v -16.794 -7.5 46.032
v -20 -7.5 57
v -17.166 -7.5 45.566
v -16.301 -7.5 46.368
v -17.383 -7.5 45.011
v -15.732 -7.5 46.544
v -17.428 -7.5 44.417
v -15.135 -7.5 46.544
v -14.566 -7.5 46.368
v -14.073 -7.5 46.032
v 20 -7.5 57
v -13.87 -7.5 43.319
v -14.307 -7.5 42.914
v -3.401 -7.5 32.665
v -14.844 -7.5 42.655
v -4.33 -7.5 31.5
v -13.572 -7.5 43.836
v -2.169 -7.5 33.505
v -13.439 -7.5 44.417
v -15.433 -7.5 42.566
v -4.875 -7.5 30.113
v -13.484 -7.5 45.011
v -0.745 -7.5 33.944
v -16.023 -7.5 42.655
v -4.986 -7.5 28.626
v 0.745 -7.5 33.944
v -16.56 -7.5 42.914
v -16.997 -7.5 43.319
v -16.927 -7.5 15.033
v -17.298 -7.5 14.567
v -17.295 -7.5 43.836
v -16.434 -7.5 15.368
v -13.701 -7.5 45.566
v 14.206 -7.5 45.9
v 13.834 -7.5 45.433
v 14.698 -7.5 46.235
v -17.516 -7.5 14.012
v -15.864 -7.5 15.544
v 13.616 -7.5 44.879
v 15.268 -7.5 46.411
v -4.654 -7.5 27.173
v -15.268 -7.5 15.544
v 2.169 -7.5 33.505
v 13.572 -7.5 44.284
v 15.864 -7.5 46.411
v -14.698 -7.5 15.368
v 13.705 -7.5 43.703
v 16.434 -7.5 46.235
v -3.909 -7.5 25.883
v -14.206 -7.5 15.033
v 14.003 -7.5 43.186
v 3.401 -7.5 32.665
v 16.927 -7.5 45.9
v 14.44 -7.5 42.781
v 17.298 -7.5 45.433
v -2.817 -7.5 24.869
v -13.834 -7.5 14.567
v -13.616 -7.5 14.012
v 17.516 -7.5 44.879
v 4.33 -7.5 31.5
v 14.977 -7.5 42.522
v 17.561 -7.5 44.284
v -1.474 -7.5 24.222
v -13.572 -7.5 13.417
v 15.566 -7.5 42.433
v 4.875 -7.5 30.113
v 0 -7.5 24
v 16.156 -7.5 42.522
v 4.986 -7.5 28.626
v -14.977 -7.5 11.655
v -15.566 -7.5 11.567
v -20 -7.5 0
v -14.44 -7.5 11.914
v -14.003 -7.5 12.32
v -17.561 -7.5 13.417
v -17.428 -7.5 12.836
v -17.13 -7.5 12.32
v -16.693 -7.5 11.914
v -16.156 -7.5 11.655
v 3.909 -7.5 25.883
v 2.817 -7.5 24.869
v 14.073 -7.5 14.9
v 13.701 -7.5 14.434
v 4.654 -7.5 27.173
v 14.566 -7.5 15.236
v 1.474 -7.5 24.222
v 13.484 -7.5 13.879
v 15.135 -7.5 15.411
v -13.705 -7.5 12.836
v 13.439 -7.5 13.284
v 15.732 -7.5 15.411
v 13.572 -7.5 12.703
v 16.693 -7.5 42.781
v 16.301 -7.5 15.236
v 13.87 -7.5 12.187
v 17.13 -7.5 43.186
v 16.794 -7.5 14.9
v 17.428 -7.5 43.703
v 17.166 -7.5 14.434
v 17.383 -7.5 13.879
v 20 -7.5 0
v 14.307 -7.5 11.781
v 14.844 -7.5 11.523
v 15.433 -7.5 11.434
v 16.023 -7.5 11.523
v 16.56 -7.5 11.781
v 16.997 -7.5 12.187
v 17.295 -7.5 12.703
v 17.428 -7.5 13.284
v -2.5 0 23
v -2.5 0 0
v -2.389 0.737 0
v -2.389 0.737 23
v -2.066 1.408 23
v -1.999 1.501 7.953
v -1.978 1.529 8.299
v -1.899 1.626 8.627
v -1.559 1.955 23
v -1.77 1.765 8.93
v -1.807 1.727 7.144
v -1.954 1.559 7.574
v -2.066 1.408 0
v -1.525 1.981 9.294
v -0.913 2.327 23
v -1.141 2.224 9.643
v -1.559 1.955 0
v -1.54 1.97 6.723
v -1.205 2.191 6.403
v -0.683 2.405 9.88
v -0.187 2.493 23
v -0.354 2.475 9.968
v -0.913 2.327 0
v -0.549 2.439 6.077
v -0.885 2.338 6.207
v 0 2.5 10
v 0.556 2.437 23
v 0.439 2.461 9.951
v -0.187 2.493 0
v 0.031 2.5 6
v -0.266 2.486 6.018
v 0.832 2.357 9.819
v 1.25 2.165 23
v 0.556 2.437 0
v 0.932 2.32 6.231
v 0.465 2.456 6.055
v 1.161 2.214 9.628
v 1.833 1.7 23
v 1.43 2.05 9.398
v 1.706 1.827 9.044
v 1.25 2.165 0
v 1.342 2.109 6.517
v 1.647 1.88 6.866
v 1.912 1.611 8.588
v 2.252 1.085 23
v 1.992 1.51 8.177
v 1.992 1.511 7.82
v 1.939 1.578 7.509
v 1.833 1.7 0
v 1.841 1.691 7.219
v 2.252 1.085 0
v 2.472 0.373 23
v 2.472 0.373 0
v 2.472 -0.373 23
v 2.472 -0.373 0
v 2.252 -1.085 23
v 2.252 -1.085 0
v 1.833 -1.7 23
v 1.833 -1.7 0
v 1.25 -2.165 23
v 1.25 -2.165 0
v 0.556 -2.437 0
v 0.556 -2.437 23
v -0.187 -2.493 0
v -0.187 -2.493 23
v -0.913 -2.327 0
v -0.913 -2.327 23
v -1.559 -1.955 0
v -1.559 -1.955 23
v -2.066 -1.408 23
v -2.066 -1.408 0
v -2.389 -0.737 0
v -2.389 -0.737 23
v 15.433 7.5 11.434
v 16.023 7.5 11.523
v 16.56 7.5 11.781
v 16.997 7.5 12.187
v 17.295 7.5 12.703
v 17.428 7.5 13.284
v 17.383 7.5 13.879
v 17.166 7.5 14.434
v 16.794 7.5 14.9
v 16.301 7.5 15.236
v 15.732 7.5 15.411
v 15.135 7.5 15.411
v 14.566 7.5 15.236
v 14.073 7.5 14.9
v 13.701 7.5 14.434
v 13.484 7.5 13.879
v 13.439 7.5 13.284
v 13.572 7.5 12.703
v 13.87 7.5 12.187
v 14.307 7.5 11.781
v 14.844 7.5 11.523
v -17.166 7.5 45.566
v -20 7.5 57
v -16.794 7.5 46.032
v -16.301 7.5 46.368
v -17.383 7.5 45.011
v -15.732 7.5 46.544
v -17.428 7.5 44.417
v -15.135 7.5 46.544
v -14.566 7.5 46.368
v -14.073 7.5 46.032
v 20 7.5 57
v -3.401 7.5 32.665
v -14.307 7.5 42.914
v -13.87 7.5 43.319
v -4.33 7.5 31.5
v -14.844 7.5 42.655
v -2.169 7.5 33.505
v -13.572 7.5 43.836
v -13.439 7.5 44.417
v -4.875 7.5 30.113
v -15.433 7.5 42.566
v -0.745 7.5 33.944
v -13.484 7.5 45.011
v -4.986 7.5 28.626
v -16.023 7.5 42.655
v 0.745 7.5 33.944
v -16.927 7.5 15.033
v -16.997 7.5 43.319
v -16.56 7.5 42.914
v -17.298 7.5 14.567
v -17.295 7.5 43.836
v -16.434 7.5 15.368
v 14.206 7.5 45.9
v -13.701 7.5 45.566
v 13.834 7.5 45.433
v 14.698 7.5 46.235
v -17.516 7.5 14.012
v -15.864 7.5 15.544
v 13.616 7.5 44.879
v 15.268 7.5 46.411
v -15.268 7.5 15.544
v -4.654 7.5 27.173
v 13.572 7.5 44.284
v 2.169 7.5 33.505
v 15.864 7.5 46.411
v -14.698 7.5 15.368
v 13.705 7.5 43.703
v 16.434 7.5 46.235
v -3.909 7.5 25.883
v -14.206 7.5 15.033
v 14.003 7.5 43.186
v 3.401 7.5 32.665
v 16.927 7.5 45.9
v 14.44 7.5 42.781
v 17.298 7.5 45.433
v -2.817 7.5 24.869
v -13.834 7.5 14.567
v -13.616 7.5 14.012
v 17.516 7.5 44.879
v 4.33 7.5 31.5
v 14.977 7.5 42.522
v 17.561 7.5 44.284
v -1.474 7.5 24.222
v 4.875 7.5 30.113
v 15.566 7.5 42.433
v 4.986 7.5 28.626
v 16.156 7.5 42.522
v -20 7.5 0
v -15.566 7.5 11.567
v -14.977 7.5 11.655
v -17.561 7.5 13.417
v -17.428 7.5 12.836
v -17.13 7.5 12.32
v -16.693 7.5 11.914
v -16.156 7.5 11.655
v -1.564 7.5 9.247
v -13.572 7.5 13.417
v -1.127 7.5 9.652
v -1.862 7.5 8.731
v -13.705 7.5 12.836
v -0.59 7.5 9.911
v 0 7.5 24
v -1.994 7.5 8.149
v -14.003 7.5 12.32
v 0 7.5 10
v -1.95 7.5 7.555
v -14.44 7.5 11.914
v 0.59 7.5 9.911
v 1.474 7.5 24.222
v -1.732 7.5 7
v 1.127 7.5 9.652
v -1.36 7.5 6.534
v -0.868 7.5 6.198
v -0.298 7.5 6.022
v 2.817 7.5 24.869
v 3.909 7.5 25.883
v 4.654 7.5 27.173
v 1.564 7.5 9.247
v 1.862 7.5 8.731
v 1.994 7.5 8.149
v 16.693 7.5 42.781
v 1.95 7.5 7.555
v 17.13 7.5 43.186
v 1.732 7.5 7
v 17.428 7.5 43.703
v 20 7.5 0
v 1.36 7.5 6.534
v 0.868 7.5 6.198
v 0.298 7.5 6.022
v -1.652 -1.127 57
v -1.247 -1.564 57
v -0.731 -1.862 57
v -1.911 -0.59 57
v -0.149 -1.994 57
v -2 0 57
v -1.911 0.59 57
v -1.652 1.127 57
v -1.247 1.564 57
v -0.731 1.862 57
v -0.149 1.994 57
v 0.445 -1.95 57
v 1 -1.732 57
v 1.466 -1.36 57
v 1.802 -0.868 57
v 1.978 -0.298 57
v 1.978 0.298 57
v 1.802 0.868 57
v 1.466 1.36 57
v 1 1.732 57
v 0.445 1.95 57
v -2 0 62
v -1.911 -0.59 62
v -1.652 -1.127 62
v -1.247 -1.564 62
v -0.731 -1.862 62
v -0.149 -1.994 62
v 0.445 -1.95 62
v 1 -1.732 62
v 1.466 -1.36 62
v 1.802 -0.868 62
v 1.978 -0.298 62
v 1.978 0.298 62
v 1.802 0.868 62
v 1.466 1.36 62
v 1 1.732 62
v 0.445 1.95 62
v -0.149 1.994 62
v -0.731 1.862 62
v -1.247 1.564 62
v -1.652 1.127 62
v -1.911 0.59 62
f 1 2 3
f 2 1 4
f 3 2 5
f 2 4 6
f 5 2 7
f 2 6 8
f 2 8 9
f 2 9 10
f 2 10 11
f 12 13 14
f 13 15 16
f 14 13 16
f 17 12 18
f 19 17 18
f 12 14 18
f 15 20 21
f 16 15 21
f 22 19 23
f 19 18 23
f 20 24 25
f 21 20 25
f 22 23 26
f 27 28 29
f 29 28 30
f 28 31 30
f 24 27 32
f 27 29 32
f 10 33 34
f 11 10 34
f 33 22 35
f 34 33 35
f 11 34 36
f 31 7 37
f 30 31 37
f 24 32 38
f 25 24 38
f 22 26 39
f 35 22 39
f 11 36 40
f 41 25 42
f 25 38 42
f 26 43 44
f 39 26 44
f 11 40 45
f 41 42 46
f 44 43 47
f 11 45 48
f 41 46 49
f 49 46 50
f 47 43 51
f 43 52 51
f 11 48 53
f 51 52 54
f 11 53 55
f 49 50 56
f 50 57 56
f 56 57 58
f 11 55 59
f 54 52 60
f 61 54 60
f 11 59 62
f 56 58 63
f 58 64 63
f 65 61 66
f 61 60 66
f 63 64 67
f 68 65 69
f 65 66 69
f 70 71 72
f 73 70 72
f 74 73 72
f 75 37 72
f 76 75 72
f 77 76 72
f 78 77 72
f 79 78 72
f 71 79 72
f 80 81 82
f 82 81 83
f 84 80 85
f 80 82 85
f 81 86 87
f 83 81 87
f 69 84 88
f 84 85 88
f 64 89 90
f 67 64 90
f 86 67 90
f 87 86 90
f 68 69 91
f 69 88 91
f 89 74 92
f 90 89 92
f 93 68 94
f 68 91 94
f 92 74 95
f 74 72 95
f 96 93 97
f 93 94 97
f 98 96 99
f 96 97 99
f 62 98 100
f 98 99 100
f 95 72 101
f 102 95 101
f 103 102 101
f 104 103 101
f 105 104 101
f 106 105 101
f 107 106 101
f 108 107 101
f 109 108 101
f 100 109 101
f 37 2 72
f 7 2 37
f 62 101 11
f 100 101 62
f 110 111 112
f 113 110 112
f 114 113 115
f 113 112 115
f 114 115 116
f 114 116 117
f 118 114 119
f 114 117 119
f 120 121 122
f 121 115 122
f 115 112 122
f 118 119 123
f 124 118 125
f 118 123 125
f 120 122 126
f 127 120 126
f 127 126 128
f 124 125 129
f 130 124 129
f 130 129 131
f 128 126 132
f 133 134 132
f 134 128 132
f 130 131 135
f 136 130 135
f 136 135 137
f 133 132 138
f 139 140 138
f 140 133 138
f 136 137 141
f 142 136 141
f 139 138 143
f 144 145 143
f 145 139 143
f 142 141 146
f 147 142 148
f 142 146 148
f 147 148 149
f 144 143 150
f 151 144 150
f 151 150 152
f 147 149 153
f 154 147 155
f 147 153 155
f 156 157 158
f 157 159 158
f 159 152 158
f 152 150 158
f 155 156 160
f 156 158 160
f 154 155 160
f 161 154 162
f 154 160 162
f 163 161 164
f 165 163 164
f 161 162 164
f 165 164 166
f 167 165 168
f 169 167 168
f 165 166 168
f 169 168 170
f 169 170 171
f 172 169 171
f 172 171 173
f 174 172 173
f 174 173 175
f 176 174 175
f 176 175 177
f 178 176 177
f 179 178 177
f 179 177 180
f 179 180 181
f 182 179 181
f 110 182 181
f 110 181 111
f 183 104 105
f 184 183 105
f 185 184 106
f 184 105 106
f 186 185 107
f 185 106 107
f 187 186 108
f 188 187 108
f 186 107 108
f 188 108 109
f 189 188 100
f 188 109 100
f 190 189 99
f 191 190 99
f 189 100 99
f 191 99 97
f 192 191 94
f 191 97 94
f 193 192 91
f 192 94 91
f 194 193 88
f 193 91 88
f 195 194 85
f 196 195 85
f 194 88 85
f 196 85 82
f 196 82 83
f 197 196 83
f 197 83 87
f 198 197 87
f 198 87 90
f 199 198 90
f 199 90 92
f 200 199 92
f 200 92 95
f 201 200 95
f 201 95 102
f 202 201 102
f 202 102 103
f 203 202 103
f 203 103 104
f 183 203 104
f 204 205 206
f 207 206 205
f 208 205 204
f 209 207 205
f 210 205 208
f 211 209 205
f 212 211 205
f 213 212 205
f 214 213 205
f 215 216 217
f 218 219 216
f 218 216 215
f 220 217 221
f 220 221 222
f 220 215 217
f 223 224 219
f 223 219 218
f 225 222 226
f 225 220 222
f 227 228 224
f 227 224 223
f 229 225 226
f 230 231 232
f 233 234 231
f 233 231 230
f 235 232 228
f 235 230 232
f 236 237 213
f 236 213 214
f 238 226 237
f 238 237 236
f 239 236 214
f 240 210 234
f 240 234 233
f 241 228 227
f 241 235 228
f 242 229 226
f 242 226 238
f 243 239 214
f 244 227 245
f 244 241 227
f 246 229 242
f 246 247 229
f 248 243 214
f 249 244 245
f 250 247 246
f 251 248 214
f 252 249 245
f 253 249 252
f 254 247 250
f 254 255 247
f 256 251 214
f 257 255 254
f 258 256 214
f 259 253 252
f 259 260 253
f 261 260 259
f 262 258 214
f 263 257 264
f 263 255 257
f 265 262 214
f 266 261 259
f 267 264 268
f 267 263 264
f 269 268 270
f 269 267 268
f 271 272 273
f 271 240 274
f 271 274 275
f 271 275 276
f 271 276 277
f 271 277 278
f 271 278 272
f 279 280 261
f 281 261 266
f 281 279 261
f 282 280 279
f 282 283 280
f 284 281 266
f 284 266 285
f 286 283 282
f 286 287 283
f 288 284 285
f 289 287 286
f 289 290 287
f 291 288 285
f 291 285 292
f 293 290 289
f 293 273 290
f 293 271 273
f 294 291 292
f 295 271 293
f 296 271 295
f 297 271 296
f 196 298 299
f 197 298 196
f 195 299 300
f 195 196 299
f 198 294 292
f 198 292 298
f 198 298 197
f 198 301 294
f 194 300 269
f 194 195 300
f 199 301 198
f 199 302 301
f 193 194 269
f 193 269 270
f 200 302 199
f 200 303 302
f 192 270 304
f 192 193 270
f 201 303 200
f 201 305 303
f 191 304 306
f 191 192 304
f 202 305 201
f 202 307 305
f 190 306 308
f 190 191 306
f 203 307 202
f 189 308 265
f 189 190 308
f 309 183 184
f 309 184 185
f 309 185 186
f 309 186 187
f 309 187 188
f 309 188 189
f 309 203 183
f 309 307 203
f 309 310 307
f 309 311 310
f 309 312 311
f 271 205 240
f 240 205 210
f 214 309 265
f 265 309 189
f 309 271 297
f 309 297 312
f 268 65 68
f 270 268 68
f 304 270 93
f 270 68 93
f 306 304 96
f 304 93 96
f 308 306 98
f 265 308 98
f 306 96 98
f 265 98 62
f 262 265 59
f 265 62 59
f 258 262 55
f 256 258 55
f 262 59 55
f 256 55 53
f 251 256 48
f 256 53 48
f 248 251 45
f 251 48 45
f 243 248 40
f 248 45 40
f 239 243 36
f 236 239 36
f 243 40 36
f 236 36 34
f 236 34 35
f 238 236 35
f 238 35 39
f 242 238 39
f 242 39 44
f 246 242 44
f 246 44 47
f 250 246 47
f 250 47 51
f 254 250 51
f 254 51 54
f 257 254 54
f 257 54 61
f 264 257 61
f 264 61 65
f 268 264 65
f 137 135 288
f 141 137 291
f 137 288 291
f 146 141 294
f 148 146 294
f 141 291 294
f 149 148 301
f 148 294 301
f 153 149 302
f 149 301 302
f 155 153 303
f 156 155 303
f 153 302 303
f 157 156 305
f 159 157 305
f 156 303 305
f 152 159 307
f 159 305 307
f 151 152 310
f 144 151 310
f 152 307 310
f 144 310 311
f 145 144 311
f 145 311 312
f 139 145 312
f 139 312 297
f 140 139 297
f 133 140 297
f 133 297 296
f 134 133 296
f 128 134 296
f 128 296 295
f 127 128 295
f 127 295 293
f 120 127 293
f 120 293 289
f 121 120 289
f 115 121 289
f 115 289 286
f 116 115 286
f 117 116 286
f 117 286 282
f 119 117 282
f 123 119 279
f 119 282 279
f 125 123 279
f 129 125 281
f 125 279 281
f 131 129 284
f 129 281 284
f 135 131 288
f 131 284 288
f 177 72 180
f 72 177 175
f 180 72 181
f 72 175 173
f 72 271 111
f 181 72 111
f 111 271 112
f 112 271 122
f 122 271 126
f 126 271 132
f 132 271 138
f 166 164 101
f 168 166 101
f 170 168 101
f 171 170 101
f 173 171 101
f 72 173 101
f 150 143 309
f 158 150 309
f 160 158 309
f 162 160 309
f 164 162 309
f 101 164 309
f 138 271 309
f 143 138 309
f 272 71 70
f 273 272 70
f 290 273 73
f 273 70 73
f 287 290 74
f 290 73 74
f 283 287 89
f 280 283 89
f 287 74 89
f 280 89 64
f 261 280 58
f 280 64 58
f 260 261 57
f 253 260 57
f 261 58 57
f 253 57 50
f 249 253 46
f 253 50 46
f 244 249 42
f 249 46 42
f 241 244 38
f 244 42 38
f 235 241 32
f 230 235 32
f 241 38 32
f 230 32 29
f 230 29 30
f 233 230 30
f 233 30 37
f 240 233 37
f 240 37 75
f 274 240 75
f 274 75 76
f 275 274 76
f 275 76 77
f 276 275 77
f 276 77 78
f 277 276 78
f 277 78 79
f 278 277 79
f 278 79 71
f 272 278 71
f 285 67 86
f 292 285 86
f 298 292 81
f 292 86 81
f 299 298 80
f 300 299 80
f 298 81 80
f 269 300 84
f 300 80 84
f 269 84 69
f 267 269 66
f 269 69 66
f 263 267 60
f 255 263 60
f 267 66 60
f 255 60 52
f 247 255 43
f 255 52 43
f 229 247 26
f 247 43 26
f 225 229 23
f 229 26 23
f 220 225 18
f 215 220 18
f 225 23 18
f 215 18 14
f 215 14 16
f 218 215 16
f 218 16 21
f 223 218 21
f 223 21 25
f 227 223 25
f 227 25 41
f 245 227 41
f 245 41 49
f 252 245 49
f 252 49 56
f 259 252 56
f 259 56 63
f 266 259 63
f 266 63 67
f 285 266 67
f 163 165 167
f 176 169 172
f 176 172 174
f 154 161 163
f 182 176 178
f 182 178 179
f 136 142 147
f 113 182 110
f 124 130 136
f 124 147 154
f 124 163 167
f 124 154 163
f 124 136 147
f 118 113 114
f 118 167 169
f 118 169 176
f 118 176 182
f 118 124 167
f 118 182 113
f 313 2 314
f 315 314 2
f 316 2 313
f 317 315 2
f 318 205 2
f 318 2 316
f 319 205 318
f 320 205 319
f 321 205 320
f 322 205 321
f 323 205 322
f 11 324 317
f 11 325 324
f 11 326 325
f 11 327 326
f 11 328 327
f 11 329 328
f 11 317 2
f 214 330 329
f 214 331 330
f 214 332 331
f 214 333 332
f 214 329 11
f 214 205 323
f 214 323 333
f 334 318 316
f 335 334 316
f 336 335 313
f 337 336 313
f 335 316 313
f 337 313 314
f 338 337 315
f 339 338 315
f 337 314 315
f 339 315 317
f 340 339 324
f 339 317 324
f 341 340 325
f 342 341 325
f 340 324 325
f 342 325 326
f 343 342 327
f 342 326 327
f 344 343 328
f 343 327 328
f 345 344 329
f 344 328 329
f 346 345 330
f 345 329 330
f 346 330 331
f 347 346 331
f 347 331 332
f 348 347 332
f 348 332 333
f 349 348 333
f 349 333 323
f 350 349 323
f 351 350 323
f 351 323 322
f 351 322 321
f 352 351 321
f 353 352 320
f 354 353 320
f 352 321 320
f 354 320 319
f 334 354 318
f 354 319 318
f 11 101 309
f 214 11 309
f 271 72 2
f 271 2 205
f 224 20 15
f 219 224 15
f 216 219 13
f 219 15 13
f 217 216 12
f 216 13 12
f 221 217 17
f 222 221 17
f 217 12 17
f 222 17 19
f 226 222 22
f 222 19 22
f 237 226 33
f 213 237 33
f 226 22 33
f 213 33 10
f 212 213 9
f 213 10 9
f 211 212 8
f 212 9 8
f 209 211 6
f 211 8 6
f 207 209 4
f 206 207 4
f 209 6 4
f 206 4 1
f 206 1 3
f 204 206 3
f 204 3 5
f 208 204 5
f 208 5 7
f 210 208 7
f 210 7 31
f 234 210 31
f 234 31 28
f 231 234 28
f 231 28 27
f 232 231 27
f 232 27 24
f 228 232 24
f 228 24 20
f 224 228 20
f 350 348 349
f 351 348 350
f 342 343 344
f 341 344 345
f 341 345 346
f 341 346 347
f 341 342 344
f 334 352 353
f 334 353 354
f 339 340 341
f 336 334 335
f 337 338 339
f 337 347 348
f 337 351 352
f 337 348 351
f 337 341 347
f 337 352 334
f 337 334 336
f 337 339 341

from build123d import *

# Parameters (mm, degrees)
SKETCH1_W           = 40
SKETCH1_H           = 15
BOSS_EXTRUDE1_DEPTH = 57
SKETCH2_R           = 2
BOSS_EXTRUDE2_DEPTH = 5
SKETCH3_R           = 2.5
CUT_EXTRUDE1_DEPTH  = 23
SKETCH5_R           = 2
CUT_EXTRUDE3_DEPTH  = 8
SKETCH7_R           = 5
CUT_EXTRUDE5_DEPTH  = 67.850579676
SKETCH8_R           = 2
CUT_EXTRUDE6_DEPTH  = 29


with BuildPart() as part:
    # Sketch1 → Boss-Extrude1 (new body)
    with BuildSketch(Plane.XY):
        Rectangle(SKETCH1_W, SKETCH1_H)
    extrude(amount=BOSS_EXTRUDE1_DEPTH)

    # Sketch2 → Boss-Extrude2 (add)
    with BuildSketch(Plane.XY.offset(57)):
        with Locations(Location((0, 0, 0), (0, 0, 180))):
            Circle(SKETCH2_R)
    extrude(amount=BOSS_EXTRUDE2_DEPTH)

    # Sketch3 → Cut-Extrude1 (cut)
    with BuildSketch(Plane(origin=(0, 0, 0), x_dir=(-1, 0, 0), z_dir=(0, 0, -1))):
        Circle(SKETCH3_R)
    extrude(amount=-CUT_EXTRUDE1_DEPTH, mode=Mode.SUBTRACT)

    # Sketch5 → Cut-Extrude3 (cut)
    with BuildSketch(Plane(origin=(0, 7.5, 0), x_dir=(1, 0, 0), z_dir=(0, 1, 0))):
        with Locations(Location((0, -8, 0), (0, 0, 270))):
            Circle(SKETCH5_R)
    extrude(amount=-CUT_EXTRUDE3_DEPTH, mode=Mode.SUBTRACT)

    # Sketch7 → Cut-Extrude5 (cut, through all)
    with BuildSketch(Plane(origin=(0, -7.5, 0), x_dir=(-1, 0, 0), z_dir=(0, -1, 0))):
        with Locations(Location((0, -29, 0), (0, 0, 90))):
            Circle(SKETCH7_R)
    extrude(amount=-CUT_EXTRUDE5_DEPTH, mode=Mode.SUBTRACT)

    # Sketch8 → Cut-Extrude6 (cut)
    with BuildSketch(Plane(origin=(0, -7.5, 0), x_dir=(-1, 0, 0), z_dir=(0, -1, 0))):
        with Locations(Location((-15.433459582, -13.433744017, 0), (0, 0, 90))):
            Circle(SKETCH8_R)
        with Locations(Location((-15.566255983, -44.433459582, 0), (0, 0, 90))):
            Circle(SKETCH8_R)
        with Locations(Location((15.433459582, -44.566255983, 0), (0, 0, 90))):
            Circle(SKETCH8_R)
        with Locations(Location((15.566255983, -13.566540418, 0), (0, 0, 90))):
            Circle(SKETCH8_R)
    extrude(amount=-CUT_EXTRUDE6_DEPTH, mode=Mode.SUBTRACT)


solid = part.part
